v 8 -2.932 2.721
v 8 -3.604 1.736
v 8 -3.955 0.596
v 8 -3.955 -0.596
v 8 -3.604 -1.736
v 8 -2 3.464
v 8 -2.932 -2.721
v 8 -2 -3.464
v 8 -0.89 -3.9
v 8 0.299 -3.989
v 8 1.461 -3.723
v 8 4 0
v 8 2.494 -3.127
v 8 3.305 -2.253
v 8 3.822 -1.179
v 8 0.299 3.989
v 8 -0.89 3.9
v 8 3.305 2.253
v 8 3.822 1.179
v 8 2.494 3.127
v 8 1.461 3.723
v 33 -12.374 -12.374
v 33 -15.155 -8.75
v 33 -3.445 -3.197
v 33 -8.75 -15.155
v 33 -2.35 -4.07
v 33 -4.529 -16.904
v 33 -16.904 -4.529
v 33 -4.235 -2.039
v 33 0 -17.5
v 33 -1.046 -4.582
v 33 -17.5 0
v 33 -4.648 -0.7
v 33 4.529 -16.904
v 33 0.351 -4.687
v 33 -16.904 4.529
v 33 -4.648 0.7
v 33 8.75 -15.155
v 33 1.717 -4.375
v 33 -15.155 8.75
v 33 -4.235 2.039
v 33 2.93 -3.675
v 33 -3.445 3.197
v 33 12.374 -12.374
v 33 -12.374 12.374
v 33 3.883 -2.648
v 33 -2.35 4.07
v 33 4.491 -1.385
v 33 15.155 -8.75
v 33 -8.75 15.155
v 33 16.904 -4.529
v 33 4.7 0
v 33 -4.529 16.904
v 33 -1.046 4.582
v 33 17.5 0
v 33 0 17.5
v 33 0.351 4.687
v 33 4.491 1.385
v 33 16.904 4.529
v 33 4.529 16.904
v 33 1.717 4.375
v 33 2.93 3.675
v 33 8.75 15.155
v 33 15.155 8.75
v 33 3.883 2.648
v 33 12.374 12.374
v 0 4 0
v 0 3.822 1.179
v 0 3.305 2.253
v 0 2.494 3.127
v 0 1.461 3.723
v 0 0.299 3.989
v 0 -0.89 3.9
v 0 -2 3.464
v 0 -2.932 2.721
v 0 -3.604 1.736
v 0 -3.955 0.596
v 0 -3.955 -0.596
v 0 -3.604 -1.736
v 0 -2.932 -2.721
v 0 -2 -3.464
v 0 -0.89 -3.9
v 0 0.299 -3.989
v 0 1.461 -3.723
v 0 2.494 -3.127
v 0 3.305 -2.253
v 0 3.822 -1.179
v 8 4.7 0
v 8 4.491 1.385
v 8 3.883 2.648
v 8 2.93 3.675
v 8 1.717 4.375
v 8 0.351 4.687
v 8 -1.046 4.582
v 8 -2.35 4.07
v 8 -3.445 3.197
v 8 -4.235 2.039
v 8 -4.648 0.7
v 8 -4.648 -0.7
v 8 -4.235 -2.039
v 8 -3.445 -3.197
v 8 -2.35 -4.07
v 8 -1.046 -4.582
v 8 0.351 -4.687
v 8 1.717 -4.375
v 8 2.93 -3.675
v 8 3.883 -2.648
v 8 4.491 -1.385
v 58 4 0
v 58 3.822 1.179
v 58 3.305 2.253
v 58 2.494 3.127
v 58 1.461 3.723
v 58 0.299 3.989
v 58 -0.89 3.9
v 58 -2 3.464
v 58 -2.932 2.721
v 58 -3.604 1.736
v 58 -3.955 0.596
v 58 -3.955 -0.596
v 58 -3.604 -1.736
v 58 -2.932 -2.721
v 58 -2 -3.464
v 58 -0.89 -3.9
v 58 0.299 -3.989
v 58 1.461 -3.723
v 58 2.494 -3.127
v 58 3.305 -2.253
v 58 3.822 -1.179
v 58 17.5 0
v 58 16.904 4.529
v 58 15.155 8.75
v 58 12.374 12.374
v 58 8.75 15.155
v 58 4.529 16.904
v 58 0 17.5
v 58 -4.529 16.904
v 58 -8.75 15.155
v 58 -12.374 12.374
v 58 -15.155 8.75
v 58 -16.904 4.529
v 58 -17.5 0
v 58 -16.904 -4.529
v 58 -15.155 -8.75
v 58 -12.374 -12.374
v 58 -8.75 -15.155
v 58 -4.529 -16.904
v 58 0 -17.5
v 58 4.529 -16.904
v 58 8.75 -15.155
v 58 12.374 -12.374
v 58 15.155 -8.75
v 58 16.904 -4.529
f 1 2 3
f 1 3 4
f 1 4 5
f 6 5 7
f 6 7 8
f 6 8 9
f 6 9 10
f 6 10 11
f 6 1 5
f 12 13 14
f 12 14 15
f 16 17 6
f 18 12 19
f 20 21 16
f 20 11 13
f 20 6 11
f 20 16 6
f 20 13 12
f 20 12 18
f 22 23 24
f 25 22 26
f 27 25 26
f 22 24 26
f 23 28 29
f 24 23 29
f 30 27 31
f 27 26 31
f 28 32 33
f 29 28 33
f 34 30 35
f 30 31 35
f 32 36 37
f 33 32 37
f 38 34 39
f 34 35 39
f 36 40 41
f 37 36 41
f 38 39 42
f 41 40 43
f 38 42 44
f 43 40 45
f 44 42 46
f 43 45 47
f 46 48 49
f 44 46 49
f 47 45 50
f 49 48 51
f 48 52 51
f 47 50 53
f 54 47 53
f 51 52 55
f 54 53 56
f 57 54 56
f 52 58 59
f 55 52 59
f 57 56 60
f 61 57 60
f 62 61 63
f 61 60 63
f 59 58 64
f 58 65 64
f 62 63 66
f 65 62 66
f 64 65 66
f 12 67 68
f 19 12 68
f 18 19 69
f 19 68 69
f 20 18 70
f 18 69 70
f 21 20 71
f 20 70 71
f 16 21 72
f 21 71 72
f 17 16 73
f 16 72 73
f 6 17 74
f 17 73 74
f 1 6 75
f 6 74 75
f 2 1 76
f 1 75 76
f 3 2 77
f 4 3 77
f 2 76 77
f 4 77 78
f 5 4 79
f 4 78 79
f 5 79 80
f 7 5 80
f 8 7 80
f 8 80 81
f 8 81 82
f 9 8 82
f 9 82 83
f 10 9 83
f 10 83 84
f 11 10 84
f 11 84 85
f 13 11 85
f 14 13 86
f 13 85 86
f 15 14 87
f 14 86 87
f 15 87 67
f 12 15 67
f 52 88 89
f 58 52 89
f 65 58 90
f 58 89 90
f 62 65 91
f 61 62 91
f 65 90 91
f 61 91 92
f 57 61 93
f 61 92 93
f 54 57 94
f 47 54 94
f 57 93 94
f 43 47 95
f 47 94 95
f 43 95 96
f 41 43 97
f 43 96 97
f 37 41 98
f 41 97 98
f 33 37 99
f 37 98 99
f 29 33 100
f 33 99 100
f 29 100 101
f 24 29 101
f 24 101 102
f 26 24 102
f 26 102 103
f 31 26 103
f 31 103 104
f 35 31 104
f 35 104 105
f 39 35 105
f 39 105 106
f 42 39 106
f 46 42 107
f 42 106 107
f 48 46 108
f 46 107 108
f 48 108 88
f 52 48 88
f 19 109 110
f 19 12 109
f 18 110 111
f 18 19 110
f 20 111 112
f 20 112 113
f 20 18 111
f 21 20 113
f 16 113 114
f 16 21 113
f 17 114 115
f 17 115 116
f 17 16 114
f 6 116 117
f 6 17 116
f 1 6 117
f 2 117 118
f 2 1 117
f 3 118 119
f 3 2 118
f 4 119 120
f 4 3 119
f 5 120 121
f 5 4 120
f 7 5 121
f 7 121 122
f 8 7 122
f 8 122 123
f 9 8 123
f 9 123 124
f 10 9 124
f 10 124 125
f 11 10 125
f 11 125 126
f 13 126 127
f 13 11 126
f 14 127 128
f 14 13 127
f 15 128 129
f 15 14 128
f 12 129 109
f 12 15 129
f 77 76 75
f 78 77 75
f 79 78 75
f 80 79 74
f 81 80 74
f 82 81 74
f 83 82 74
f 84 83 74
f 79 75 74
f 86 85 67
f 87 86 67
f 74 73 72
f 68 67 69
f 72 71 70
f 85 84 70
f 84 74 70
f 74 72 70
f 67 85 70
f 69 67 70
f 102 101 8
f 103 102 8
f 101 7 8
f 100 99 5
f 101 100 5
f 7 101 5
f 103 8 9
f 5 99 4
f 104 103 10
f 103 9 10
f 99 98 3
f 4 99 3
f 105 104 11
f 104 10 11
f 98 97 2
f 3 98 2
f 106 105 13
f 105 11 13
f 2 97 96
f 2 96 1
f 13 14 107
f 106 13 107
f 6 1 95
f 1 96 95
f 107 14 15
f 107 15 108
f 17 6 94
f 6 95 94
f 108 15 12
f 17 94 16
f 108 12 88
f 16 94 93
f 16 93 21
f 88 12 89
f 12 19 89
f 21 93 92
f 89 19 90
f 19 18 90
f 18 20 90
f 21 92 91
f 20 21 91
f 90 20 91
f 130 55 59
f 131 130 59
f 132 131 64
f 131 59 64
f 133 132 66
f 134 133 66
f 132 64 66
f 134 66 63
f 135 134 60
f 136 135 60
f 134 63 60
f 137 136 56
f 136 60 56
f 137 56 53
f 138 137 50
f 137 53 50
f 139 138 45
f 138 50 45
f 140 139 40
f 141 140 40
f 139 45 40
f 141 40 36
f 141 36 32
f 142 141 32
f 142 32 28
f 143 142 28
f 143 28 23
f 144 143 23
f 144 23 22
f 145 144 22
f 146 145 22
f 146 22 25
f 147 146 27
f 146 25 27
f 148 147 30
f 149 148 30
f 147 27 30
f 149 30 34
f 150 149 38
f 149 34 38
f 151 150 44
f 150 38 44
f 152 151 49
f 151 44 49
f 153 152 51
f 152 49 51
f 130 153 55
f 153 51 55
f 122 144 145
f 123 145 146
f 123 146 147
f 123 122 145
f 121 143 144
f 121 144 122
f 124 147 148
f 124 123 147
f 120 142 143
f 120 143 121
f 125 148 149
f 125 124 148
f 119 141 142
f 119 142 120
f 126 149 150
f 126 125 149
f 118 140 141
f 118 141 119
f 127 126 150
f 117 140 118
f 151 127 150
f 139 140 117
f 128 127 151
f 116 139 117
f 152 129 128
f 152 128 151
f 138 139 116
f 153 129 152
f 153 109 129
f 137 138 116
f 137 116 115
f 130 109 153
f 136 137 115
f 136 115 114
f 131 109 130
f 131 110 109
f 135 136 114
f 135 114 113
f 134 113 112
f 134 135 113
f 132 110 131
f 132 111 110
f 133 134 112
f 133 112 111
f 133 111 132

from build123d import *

# Parameters (mm, degrees)
F0_R     = 4
F1_DEPTH = 8
F2_R     = 4.7
F2_R_2   = 4
F3_DEPTH = 25
F4_R     = 17.5
F4_R_2   = 4.7
F4_R_3   = 4
F5_DEPTH = 25


with BuildPart() as f1:
    # F0 (on Right) → F1 (new body)
    with BuildSketch(Plane.YZ):
        Circle(F0_R)
    extrude(amount=F1_DEPTH)

    # F2 (on face) → F3 (join)
    with BuildSketch(Plane.YZ.offset(8)):
        Circle(F2_R)
        Circle(F2_R_2, mode=Mode.SUBTRACT)
    extrude(amount=F3_DEPTH)

    # F4 (on face) → F5 (join)
    with BuildSketch(Plane.YZ.offset(33)):
        Circle(F4_R)
        Circle(F4_R_2, mode=Mode.SUBTRACT)
        Circle(F4_R_2)
        Circle(F4_R_3, mode=Mode.SUBTRACT)
    extrude(amount=F5_DEPTH)


solid = f1.part
